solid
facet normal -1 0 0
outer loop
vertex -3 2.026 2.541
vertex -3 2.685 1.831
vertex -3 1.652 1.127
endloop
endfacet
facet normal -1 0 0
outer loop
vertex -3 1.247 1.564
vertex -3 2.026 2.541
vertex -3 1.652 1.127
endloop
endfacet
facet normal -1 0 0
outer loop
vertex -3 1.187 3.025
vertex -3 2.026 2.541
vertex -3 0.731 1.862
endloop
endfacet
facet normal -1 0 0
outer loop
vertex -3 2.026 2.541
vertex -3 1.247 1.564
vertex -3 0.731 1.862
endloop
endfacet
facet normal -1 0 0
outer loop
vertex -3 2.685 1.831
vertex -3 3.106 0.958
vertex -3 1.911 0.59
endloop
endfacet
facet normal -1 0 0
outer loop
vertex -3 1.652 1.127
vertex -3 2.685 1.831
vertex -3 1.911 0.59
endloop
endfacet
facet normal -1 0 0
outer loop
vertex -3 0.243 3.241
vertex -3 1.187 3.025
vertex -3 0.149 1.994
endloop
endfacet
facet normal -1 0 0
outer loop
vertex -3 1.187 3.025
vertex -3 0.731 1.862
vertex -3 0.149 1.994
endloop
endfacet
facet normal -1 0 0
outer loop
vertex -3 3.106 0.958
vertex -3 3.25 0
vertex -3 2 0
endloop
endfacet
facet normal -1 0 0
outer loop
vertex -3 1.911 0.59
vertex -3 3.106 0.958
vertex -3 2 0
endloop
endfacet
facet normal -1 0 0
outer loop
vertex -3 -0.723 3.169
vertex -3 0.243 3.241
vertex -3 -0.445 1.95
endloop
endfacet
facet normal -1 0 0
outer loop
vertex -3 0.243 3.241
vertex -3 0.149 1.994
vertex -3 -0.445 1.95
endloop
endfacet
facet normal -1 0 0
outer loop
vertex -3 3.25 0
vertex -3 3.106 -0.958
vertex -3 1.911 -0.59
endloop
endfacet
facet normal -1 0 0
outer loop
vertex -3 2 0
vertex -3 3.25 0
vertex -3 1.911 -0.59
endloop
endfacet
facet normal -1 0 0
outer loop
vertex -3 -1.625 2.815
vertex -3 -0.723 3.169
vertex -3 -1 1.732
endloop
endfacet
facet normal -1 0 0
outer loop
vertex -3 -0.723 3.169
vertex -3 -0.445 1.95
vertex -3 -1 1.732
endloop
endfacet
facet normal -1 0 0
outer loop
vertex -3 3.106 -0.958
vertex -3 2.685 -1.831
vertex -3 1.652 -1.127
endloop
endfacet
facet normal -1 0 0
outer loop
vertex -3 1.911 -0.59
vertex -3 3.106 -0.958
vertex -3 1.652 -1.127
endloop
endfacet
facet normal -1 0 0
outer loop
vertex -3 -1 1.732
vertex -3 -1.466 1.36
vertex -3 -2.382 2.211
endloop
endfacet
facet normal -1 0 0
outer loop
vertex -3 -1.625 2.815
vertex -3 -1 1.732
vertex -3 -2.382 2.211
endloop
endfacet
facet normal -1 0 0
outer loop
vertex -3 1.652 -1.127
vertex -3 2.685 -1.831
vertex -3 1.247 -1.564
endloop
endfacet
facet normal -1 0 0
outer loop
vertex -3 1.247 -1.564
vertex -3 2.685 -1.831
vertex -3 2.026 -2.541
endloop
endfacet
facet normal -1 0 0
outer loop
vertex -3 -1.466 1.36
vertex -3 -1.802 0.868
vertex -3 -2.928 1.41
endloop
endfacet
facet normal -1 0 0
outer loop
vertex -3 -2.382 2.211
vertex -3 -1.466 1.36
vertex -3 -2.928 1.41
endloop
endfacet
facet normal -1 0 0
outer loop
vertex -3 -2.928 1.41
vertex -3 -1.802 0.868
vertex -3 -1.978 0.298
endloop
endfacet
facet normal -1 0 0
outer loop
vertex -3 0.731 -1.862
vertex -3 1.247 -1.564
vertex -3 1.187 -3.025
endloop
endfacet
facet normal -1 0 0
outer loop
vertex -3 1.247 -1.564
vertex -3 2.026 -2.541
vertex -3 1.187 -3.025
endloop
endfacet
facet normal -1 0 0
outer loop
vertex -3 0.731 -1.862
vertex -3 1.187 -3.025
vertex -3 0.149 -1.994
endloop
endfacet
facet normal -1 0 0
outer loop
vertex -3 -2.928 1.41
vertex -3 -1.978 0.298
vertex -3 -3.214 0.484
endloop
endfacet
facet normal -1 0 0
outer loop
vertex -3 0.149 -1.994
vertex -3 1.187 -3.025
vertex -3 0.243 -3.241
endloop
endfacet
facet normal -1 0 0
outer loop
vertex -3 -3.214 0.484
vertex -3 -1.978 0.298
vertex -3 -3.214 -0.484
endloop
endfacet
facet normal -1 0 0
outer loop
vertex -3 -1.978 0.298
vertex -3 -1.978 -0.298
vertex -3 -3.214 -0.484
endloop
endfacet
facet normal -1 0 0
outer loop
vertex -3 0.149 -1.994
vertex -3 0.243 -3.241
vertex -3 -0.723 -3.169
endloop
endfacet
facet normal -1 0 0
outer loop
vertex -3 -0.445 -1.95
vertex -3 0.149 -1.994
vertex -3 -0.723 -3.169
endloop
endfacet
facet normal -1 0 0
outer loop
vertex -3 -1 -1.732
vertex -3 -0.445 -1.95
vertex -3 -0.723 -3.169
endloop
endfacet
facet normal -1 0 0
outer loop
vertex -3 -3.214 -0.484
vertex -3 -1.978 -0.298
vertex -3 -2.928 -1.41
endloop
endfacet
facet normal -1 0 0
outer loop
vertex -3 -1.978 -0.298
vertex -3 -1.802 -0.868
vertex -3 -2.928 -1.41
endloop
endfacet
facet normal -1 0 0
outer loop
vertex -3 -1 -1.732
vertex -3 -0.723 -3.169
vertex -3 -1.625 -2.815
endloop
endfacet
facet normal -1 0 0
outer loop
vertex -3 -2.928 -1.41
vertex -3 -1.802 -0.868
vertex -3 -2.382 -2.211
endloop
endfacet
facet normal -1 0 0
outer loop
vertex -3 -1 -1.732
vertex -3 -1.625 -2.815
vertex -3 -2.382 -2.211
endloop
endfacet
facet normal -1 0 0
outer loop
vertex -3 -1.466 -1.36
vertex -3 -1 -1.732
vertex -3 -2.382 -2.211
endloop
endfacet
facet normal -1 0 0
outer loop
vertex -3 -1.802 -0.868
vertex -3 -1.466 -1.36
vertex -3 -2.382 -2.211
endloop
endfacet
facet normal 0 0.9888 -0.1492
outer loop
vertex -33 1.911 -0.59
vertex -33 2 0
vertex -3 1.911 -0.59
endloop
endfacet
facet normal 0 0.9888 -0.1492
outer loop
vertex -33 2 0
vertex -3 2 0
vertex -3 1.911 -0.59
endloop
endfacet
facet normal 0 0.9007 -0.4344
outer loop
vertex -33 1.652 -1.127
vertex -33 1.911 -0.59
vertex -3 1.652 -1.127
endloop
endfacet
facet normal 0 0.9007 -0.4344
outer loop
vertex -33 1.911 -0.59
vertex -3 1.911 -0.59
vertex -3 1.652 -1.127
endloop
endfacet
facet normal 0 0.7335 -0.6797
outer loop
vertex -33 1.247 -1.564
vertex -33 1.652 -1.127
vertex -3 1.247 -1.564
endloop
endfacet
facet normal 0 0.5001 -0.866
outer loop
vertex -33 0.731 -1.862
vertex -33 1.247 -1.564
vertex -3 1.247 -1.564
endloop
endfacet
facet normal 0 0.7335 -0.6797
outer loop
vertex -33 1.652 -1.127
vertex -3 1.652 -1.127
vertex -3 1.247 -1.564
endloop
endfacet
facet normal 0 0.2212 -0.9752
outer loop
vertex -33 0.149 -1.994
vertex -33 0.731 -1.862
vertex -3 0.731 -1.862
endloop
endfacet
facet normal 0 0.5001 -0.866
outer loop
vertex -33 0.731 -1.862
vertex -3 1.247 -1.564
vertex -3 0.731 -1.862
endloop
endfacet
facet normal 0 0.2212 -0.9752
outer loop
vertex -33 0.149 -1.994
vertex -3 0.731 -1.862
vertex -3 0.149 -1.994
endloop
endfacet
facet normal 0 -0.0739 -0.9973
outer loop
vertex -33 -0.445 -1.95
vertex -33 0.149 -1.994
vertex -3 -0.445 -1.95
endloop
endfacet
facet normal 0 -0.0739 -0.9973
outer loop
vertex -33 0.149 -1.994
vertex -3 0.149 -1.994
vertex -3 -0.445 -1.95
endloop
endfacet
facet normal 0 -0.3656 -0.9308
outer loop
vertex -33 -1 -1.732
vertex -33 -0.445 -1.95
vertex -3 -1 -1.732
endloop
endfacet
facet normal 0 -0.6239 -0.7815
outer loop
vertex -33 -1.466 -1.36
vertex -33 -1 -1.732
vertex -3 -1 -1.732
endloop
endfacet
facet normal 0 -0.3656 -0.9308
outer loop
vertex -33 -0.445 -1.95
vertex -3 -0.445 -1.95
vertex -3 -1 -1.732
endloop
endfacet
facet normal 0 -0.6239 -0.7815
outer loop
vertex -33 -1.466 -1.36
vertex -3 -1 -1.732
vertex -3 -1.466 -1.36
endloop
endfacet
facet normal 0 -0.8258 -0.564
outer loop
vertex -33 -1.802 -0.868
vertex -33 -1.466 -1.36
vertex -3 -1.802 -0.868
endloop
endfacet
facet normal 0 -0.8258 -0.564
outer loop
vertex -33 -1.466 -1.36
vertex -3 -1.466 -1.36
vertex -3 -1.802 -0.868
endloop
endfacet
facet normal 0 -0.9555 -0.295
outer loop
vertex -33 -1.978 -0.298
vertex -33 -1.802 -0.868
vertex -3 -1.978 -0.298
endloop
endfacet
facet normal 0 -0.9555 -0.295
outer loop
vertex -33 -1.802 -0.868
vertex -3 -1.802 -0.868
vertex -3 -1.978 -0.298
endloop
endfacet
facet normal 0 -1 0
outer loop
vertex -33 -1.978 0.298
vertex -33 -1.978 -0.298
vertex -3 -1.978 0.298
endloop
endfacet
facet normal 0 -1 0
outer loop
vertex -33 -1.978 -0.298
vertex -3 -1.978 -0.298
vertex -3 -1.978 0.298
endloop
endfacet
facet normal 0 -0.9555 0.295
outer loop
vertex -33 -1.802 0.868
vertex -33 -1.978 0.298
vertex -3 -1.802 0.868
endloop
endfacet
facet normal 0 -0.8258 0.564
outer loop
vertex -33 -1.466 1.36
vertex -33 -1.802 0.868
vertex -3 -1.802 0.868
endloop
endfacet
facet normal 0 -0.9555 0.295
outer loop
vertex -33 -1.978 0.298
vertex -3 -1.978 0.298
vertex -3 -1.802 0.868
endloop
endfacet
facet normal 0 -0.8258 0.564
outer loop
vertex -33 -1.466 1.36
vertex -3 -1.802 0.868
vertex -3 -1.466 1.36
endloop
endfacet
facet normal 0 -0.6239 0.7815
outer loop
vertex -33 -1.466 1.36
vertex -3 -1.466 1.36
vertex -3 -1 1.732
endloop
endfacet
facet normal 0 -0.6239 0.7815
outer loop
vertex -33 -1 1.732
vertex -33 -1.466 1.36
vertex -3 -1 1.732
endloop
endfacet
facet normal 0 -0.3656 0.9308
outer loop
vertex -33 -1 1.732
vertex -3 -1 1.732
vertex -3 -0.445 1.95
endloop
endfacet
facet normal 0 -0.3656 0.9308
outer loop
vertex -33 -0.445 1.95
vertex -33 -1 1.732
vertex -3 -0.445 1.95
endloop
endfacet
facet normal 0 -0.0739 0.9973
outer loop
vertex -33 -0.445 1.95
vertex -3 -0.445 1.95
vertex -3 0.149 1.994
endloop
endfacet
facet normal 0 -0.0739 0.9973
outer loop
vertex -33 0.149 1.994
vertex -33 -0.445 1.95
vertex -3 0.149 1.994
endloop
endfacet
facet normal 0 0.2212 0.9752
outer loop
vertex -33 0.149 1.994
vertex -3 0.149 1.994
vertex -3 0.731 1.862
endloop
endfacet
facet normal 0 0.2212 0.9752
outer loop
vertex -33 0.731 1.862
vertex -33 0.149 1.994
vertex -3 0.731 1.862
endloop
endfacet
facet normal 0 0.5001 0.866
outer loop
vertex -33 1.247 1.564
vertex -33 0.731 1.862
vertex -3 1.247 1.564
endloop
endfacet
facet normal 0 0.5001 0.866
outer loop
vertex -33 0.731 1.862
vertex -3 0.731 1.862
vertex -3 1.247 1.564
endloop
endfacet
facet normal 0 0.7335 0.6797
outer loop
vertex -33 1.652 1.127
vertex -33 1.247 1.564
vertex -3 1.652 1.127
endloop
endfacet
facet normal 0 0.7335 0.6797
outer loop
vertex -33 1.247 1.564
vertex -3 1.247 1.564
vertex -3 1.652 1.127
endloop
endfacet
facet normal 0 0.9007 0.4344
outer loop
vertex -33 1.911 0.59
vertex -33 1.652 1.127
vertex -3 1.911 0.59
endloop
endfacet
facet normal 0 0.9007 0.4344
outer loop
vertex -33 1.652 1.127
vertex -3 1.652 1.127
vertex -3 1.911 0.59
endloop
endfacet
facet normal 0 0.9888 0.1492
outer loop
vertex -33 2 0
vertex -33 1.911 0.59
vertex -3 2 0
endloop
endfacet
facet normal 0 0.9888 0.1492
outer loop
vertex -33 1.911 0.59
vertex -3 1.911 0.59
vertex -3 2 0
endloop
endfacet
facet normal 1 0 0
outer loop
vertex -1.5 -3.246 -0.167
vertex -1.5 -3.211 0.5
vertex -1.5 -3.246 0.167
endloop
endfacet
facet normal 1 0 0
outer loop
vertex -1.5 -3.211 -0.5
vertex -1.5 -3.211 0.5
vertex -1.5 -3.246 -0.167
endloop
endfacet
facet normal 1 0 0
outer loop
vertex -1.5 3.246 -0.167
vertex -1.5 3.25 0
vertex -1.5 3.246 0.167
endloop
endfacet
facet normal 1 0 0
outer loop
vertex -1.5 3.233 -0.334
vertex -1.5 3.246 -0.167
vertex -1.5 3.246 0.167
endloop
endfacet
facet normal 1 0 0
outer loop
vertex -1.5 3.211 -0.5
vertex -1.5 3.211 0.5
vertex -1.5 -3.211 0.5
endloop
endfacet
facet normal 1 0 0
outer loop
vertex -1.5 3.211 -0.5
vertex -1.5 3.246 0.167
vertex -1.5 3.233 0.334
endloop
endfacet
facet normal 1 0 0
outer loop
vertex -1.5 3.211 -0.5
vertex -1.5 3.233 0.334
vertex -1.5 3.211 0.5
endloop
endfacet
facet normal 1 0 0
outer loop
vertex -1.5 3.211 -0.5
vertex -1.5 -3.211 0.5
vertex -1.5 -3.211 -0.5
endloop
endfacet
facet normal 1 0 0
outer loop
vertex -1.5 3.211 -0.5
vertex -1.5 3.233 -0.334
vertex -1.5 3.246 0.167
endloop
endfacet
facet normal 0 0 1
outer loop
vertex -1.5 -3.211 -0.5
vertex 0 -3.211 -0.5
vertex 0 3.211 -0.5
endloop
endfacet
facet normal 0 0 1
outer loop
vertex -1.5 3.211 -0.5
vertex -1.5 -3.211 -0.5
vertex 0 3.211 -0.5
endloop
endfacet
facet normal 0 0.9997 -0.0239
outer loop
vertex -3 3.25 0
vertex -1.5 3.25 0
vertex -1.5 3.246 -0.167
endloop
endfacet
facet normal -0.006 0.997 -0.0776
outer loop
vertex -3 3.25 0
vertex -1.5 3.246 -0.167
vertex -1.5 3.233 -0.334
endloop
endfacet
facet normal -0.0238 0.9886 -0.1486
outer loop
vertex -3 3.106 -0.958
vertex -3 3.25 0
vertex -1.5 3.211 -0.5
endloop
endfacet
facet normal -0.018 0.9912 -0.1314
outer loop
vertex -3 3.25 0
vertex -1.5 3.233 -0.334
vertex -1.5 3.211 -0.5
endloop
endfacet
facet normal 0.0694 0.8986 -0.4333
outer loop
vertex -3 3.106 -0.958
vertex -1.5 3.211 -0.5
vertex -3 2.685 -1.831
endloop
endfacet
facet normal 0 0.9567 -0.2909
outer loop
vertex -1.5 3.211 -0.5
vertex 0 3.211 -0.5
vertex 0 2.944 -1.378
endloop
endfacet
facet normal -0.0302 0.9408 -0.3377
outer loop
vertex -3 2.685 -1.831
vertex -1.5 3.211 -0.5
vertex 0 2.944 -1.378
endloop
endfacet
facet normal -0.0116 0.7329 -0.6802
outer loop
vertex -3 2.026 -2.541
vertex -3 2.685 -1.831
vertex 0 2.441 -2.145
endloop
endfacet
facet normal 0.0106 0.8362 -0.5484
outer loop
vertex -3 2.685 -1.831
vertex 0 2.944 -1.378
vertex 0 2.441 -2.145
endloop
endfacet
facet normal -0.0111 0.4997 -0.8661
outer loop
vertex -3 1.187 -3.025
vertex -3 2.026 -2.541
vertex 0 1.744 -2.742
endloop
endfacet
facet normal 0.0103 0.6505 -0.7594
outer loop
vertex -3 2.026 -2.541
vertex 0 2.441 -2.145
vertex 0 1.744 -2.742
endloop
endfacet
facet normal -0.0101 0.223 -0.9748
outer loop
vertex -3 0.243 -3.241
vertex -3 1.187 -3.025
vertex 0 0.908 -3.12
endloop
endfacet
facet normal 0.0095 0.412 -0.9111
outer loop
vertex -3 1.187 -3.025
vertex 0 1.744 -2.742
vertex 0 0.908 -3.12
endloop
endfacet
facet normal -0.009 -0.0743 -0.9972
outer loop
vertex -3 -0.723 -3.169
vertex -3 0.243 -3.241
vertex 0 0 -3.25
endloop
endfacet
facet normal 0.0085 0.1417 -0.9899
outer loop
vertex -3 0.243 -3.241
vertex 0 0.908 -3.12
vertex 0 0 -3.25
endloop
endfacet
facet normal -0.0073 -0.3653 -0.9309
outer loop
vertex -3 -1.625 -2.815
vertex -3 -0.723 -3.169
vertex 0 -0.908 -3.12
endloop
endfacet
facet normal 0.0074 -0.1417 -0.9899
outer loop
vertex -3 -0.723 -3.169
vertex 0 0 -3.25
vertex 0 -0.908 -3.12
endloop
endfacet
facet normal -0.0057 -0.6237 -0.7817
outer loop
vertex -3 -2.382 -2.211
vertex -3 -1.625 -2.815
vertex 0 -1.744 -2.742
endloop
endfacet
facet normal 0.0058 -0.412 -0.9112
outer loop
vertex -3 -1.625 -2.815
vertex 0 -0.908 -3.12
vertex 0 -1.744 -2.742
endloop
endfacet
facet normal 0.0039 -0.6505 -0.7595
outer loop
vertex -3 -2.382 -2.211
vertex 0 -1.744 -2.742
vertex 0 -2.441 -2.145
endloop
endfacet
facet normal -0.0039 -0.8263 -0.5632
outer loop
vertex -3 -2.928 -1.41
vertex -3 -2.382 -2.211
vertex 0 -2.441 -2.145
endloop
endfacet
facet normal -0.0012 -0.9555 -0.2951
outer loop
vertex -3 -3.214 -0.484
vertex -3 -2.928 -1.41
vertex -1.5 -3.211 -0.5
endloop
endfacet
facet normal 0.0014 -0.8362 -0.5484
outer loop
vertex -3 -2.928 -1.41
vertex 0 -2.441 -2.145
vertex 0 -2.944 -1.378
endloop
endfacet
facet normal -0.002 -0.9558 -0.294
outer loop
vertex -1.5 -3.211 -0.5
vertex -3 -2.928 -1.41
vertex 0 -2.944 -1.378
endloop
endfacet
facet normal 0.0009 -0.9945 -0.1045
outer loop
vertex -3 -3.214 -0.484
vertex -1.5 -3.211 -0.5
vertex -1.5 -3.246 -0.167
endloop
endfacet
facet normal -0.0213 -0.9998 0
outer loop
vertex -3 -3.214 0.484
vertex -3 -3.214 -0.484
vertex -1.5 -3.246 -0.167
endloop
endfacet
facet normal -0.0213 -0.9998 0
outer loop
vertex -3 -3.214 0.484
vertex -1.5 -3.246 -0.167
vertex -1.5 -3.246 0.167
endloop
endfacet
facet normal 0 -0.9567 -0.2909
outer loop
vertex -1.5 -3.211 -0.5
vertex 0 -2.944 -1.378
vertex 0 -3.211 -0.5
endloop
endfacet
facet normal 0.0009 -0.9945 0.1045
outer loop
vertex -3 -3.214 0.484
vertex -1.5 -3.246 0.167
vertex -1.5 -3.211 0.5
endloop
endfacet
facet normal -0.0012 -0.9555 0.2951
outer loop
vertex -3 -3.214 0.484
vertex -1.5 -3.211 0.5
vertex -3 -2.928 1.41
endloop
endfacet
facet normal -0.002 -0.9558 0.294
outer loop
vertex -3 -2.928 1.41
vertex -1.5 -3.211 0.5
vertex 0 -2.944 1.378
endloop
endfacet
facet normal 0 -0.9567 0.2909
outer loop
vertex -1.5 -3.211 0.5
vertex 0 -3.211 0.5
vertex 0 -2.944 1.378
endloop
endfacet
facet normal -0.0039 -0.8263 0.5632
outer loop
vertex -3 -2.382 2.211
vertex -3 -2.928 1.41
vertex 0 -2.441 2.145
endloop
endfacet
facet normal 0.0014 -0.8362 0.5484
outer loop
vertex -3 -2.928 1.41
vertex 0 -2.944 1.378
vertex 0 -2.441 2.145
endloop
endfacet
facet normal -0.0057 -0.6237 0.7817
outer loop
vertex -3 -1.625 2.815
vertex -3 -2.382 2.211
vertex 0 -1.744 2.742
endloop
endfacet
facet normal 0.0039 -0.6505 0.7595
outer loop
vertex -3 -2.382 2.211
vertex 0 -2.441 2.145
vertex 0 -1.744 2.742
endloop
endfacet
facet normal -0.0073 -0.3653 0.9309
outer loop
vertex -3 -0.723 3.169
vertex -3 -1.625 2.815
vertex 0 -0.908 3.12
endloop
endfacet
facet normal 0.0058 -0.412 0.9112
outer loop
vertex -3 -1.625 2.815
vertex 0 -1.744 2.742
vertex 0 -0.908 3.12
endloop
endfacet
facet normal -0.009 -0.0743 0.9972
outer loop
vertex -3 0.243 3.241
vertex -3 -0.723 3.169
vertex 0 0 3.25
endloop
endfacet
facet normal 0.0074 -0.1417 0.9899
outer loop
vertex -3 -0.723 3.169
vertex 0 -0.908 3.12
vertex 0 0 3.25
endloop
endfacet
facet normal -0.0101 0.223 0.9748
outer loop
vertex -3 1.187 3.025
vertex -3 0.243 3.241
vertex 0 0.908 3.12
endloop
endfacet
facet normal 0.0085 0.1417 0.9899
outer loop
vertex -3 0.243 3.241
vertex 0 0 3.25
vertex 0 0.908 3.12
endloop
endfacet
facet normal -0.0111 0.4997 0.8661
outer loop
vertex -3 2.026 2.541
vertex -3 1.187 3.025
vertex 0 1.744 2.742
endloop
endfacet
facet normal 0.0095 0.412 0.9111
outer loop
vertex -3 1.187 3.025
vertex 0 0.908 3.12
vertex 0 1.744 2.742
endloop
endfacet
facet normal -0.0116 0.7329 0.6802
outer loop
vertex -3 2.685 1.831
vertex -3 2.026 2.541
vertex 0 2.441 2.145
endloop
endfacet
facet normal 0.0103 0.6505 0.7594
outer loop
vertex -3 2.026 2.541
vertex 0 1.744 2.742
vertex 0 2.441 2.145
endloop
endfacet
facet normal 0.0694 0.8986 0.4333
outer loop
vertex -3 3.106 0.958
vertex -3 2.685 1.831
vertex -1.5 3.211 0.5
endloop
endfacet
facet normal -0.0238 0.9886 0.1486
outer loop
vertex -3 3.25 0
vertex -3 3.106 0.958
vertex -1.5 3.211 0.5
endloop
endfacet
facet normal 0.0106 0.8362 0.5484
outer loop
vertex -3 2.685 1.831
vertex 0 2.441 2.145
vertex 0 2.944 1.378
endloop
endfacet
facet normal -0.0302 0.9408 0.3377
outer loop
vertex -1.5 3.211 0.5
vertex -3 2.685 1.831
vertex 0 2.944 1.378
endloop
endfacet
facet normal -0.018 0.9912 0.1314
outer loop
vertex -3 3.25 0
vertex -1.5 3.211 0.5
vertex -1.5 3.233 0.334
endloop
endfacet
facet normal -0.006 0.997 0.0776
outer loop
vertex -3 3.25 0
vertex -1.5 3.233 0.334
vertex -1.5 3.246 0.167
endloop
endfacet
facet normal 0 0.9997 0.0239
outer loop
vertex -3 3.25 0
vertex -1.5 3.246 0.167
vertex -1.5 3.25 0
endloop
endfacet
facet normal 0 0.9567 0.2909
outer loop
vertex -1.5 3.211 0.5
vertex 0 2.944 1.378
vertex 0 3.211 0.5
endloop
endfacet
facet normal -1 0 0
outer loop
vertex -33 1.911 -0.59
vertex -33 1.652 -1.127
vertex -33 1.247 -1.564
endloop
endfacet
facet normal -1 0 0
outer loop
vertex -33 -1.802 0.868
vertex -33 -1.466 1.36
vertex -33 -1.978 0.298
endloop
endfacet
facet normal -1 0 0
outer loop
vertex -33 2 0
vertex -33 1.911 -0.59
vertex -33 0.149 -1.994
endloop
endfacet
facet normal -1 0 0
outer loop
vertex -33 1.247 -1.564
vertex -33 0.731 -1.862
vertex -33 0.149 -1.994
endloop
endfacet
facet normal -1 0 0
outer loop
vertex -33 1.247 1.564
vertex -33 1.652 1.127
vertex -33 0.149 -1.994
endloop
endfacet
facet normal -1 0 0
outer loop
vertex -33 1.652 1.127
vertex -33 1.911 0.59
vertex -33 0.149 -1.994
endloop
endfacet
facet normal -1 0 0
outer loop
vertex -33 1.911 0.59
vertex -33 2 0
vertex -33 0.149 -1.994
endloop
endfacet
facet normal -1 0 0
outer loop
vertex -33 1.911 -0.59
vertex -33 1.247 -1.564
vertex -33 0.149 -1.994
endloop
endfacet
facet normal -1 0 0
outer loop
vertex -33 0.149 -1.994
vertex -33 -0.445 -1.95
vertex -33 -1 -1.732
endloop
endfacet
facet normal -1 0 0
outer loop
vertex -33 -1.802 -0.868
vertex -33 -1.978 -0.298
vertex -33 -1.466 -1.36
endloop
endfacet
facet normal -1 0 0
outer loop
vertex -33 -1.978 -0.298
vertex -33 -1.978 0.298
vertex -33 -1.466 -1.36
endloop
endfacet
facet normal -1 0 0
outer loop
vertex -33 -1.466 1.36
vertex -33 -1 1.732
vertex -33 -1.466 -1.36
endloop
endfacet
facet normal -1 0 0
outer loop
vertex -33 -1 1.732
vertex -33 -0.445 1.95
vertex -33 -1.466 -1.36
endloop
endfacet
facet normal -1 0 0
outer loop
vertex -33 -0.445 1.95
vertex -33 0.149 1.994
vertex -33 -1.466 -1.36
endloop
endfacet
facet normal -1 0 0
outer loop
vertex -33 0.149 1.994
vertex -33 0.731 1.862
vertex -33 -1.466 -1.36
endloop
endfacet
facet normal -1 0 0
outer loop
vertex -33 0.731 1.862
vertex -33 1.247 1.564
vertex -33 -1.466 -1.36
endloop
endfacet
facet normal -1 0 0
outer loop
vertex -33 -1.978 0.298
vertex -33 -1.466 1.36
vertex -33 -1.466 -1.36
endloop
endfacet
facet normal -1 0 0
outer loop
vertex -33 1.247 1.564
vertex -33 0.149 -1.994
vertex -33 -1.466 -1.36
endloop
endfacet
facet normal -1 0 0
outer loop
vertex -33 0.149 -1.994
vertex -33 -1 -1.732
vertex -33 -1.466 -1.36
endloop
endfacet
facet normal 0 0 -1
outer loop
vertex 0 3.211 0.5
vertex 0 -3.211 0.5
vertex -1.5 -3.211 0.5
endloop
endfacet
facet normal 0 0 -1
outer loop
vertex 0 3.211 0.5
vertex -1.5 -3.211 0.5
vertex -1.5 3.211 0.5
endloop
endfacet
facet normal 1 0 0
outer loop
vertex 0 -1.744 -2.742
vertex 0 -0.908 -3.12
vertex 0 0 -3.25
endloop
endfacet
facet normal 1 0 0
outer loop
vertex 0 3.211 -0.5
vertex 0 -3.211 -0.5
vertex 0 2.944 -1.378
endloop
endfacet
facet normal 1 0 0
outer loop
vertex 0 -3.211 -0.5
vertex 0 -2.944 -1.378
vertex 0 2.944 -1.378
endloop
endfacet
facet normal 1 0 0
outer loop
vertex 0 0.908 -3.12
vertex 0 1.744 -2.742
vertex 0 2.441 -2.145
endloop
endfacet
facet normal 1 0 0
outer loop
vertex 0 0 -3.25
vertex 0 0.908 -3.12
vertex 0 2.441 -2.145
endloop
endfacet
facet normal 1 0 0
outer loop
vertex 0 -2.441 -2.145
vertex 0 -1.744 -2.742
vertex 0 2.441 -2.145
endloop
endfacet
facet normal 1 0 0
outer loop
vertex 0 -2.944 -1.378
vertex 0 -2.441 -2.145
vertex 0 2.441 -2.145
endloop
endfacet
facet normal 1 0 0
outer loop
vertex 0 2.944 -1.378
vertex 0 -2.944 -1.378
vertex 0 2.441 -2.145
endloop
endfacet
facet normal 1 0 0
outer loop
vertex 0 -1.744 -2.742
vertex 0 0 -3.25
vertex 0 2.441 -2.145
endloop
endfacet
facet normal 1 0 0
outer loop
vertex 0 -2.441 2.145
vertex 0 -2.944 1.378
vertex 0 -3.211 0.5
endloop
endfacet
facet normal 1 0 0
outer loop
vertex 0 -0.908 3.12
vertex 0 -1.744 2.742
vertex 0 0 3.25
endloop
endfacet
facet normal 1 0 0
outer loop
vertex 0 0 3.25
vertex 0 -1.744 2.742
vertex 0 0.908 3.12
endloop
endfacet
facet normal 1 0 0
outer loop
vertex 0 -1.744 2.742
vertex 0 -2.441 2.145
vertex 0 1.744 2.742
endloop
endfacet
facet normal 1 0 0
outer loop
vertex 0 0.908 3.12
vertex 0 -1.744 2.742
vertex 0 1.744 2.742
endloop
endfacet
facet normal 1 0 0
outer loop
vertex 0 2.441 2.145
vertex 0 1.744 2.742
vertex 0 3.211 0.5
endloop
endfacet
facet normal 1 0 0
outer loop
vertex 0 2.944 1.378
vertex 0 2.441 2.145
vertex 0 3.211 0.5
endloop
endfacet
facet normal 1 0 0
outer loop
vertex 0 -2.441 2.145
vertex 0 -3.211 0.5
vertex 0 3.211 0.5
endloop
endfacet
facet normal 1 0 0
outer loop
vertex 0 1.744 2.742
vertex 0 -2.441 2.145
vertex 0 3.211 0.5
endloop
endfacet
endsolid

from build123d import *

# Parameters (mm, degrees)
SKETCH2_W          = 1
SKETCH2_H          = 6.5
CUT_EXTRUDE1_DEPTH = 1.5


with BuildPart() as part:
    # Sketch1 → Revolve1 (revolve)
    with BuildSketch(Plane.XY):
        Polygon((0, 0), (-33, 0), (-33, 2), (-3, 2), (-3, 3.25), (0, 3.25), align=None)
    revolve(axis=Axis((0, 0, 0), (-1, 0, 0)))

    # Sketch2 → Cut-Extrude1 (cut)
    with BuildSketch(Plane(origin=(0, 0, 0), x_dir=(0, 0, -1), z_dir=(1, 0, 0))):
        Rectangle(SKETCH2_W, SKETCH2_H)
    extrude(amount=-CUT_EXTRUDE1_DEPTH, mode=Mode.SUBTRACT)


solid = part.part
